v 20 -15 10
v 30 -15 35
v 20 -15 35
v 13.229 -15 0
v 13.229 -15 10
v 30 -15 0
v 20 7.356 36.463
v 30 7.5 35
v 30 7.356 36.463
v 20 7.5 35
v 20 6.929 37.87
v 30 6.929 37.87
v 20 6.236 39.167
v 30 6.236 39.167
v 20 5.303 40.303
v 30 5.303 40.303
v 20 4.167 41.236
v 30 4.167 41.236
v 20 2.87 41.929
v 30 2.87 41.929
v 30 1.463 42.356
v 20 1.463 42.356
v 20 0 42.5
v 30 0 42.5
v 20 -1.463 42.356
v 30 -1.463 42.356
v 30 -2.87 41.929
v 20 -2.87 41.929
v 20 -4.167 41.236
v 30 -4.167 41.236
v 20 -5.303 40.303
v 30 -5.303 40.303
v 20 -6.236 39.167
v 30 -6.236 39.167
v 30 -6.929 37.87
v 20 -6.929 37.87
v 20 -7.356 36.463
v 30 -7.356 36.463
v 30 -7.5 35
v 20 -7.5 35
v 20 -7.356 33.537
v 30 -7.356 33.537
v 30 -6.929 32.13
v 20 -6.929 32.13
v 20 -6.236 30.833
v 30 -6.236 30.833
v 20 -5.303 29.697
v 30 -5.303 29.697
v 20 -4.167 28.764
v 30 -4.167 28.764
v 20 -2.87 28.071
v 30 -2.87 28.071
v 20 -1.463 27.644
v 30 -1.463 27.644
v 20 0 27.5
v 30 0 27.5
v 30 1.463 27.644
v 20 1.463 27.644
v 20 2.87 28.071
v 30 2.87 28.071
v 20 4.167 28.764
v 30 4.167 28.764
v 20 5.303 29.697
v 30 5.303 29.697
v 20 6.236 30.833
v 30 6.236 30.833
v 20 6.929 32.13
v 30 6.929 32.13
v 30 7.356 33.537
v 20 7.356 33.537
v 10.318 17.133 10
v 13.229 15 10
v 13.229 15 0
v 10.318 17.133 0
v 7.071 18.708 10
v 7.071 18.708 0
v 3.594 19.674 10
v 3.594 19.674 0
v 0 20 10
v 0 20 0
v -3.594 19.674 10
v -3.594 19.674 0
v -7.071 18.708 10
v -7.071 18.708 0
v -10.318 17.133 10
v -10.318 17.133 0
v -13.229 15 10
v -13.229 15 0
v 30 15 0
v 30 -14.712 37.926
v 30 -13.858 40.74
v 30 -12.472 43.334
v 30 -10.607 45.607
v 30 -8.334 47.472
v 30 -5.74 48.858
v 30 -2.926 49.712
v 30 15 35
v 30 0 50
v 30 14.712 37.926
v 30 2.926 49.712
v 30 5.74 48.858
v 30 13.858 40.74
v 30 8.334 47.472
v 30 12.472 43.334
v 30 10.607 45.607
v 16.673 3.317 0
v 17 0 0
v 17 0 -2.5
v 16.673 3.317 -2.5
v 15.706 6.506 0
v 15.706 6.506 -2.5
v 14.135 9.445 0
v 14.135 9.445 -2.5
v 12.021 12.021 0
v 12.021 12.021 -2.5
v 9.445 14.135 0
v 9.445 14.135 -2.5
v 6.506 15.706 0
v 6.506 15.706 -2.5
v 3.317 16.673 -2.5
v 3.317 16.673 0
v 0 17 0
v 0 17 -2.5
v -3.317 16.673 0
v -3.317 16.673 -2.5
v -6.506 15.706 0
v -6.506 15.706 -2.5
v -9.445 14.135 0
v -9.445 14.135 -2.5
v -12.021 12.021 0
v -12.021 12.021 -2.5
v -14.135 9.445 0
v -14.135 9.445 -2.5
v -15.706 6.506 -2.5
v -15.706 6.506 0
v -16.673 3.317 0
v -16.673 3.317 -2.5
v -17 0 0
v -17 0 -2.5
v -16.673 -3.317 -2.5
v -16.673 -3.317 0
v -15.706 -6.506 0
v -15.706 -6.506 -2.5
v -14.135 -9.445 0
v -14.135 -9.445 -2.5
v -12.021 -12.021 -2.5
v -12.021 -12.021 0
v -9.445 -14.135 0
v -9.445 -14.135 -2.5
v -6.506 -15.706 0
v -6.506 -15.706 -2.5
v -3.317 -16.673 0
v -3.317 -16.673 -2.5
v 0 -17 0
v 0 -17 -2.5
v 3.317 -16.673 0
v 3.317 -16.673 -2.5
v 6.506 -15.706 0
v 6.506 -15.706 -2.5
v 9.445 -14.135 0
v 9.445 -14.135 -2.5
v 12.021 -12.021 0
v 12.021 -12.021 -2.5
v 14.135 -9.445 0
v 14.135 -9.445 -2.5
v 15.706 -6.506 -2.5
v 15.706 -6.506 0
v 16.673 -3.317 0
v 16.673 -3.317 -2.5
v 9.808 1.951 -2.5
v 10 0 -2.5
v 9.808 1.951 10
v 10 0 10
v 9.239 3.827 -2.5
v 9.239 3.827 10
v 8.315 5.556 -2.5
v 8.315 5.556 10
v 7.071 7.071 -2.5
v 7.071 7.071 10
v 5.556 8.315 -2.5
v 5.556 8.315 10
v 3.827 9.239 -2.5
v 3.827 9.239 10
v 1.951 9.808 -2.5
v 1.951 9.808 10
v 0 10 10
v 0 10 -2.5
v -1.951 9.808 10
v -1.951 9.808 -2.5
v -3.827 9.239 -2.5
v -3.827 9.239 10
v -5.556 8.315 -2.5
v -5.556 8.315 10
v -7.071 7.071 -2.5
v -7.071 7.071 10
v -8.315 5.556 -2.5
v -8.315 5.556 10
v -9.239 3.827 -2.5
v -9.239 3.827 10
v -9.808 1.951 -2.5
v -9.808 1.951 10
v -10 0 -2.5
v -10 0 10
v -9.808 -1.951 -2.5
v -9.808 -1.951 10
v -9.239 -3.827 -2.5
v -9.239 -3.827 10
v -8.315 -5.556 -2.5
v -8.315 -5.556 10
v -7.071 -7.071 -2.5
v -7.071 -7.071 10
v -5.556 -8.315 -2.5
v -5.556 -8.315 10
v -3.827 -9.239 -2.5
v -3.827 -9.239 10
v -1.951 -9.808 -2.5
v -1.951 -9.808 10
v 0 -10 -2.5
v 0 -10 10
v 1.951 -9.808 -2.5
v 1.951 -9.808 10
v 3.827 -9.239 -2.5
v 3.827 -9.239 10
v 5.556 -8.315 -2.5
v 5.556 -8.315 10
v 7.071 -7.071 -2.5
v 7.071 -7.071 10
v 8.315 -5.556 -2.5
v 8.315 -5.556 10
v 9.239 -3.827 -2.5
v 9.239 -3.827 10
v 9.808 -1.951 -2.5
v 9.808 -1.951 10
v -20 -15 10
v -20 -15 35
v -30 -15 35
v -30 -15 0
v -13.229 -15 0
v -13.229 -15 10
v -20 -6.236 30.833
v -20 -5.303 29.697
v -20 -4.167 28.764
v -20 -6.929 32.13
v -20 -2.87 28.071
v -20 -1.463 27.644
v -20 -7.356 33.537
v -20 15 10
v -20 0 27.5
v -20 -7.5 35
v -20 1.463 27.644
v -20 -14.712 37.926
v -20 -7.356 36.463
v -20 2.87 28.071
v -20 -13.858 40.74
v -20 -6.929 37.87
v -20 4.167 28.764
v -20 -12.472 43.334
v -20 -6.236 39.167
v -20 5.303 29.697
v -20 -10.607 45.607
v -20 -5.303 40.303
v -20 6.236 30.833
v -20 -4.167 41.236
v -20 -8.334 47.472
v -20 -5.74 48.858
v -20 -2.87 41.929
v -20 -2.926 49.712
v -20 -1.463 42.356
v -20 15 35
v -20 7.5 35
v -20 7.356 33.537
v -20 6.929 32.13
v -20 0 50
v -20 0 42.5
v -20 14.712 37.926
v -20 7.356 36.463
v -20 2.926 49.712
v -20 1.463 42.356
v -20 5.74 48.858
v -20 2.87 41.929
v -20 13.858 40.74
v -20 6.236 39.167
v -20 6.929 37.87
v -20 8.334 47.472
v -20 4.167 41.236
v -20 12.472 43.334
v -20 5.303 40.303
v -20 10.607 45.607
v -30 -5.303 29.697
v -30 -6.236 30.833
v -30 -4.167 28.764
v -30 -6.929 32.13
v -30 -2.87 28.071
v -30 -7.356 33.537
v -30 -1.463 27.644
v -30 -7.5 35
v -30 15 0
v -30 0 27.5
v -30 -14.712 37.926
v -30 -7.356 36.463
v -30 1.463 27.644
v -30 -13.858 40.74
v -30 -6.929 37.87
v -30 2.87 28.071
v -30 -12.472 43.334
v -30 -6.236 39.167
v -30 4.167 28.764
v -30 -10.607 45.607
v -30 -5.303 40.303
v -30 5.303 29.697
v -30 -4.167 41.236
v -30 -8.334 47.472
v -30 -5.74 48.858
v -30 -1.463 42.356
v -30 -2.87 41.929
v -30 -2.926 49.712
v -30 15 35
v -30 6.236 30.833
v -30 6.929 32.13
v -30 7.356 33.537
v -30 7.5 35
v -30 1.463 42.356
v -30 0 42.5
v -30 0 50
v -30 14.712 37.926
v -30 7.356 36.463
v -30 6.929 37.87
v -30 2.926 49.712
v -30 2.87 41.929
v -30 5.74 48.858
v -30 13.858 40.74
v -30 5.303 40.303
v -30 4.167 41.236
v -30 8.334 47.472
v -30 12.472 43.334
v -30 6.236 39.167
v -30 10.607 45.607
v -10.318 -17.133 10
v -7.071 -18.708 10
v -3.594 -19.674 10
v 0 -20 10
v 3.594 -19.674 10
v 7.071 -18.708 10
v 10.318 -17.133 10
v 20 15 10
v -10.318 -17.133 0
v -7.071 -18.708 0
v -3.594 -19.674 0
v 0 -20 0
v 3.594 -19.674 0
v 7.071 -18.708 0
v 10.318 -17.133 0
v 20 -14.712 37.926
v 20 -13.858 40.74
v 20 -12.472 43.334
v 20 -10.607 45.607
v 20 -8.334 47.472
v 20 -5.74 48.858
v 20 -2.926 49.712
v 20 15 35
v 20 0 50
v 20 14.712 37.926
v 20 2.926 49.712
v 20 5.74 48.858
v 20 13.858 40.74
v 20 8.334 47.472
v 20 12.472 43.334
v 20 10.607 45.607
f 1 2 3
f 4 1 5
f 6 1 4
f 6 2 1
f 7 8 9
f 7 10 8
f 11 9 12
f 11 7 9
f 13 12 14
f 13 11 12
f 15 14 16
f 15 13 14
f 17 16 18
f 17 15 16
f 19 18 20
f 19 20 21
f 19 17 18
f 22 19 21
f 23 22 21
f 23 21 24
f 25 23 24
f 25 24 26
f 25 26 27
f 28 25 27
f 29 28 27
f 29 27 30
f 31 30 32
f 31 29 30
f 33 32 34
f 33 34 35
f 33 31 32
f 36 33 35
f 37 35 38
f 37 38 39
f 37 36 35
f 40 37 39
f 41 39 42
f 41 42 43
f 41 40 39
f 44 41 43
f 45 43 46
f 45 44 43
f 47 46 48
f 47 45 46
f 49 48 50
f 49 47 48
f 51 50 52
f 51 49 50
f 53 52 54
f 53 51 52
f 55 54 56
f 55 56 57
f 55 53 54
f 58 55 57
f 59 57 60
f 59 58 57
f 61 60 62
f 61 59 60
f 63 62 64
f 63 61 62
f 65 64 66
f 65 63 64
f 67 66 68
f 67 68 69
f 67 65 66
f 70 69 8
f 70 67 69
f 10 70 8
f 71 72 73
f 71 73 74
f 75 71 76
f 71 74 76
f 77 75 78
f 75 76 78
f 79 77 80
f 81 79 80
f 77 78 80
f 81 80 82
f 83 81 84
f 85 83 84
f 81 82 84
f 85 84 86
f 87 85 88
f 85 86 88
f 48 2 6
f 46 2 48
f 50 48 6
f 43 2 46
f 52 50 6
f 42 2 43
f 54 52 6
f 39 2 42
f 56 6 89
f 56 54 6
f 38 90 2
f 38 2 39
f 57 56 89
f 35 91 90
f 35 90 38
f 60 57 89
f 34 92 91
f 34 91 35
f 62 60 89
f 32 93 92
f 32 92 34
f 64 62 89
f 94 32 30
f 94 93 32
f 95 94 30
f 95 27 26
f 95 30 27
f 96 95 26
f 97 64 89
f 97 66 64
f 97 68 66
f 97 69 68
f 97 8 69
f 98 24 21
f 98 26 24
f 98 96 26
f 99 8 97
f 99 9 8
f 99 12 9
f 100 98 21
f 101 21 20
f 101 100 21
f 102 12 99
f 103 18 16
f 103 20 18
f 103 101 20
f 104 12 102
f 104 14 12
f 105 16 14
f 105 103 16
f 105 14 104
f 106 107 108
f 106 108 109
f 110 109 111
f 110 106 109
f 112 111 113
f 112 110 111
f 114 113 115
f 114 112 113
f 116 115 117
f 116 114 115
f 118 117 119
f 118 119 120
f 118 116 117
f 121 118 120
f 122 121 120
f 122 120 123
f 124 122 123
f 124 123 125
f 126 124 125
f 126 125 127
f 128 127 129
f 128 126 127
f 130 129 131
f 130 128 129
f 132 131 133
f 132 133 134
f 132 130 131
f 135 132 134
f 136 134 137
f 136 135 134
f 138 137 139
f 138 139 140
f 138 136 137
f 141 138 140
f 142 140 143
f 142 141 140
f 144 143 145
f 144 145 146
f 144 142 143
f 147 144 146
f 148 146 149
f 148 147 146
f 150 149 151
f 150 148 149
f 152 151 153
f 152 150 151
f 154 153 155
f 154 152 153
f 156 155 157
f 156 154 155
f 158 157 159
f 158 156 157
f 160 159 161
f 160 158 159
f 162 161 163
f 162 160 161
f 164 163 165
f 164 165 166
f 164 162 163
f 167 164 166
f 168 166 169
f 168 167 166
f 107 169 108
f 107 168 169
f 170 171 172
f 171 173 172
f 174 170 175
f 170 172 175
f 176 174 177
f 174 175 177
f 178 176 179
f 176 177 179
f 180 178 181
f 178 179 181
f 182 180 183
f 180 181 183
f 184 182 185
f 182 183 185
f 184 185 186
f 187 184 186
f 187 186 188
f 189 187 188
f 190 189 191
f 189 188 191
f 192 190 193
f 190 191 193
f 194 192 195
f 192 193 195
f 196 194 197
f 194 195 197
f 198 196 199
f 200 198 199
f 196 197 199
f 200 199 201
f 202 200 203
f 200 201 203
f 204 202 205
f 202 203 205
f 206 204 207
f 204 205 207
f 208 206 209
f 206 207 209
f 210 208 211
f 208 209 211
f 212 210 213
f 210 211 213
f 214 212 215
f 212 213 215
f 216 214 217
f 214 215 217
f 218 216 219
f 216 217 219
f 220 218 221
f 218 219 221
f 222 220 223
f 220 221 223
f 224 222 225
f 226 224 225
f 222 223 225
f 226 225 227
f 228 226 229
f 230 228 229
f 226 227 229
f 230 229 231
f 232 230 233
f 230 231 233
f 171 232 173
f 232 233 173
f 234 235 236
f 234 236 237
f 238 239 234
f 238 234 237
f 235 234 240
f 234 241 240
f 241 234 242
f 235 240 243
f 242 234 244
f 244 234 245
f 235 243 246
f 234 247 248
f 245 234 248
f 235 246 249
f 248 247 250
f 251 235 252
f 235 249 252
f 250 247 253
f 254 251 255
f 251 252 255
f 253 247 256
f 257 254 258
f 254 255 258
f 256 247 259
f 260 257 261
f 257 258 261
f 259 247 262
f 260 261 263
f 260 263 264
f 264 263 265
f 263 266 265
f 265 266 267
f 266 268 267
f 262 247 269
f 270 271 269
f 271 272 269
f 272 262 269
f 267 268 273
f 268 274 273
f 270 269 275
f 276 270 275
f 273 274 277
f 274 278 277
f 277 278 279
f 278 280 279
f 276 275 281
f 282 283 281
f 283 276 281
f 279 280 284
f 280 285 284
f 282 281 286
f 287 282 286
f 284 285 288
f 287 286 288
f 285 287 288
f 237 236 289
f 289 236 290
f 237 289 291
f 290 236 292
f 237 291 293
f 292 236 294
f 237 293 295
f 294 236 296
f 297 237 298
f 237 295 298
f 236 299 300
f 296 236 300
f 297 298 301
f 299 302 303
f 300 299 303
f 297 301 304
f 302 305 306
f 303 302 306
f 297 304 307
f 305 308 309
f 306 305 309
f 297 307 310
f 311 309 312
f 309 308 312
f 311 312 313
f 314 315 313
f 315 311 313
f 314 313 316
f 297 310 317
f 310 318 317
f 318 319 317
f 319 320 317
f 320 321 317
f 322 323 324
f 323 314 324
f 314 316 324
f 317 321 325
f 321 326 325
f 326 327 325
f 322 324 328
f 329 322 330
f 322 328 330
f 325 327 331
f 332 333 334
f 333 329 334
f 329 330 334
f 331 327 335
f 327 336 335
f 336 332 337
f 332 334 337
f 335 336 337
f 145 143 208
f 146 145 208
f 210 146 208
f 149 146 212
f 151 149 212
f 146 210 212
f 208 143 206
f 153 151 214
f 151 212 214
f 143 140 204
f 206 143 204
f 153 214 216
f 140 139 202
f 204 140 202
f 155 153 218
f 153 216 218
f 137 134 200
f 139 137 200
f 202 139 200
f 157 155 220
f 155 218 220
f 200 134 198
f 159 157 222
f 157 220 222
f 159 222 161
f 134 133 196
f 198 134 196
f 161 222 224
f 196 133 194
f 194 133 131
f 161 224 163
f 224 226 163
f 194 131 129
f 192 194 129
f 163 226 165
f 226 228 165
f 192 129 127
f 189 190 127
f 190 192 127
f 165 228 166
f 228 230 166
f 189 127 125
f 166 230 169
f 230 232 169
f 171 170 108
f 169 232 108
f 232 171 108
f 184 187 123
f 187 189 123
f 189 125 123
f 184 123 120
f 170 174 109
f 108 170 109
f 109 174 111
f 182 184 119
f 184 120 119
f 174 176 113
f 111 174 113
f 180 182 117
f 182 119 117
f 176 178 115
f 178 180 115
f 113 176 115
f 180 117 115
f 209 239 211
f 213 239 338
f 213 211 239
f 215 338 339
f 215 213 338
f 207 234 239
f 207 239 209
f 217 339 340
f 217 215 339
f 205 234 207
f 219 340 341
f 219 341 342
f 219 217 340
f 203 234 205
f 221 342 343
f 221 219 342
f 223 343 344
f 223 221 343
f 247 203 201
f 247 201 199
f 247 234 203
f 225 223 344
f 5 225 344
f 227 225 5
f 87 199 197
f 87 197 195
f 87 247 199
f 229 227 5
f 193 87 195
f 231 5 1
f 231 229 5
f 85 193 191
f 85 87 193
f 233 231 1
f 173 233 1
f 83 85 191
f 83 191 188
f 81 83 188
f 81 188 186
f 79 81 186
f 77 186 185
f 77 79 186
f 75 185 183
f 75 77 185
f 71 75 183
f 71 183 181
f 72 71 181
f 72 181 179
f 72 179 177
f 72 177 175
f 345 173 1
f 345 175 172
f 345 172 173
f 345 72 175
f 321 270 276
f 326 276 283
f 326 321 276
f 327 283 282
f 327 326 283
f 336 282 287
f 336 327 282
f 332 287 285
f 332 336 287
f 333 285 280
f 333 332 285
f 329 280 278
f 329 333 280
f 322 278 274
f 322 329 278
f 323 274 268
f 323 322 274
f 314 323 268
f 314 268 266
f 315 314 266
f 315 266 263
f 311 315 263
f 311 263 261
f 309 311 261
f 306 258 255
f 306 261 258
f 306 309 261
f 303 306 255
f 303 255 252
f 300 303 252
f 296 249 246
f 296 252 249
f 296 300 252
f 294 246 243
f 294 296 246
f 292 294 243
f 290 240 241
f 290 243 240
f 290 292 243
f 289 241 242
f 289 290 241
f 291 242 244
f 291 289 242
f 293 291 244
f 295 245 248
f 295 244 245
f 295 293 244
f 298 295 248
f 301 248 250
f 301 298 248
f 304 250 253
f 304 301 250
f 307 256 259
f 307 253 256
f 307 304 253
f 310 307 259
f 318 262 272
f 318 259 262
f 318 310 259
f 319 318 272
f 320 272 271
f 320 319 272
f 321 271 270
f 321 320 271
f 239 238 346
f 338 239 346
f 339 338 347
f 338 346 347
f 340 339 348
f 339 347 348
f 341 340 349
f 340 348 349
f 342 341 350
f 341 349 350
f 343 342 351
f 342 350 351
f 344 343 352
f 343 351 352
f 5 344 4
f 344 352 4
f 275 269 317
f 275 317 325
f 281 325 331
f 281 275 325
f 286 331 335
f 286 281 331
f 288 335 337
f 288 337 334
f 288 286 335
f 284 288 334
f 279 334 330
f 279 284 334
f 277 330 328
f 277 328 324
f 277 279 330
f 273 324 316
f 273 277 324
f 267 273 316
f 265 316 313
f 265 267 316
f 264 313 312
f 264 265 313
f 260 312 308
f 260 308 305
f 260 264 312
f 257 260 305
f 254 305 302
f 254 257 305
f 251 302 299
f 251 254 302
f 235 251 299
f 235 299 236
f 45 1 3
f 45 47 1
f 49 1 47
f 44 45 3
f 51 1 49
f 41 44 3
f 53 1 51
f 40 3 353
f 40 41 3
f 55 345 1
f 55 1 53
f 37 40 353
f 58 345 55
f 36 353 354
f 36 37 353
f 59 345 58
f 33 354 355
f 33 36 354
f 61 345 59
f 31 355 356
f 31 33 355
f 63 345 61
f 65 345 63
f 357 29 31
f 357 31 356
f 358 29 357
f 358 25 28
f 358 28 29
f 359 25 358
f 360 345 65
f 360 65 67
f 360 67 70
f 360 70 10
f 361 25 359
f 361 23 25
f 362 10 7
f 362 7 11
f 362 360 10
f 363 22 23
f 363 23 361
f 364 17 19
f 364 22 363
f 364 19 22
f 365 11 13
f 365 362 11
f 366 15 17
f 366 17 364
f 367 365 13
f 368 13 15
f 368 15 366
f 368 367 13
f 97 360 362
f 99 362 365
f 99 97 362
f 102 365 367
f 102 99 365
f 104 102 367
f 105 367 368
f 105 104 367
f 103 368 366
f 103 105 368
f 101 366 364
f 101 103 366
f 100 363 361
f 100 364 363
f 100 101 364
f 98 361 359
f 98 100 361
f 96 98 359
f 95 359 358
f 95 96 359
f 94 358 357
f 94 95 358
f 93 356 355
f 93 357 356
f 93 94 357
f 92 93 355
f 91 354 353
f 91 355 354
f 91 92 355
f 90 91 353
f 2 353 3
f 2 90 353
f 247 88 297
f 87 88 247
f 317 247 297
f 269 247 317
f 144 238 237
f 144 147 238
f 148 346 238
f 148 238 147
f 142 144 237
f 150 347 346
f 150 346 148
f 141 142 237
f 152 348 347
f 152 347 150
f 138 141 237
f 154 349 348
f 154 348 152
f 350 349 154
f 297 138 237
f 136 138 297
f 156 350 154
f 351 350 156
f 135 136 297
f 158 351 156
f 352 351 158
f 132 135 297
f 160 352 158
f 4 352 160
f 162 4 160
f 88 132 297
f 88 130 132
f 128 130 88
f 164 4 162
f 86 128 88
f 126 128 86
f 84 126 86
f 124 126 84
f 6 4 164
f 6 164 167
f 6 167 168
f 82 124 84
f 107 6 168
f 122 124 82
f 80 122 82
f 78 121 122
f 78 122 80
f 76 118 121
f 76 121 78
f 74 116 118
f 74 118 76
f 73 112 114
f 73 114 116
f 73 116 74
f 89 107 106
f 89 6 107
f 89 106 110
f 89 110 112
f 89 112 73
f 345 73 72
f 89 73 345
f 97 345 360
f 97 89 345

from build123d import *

# Parameters (mm, degrees)
F0_R          = 7.5
F1_DEPTH      = 30
F2_W          = 40
F2_H          = 40
F3_DEPTH      = 25
F3_DEPTH_BACK = 25
F4_R          = 20
F5_DEPTH      = 10
F6_R          = 10
F7_DEPTH      = 50.001
F7_DEPTH_BACK = 25
F8_R          = 17
F9_DEPTH      = 2.5
F10_DEPTH     = 25


with BuildPart() as f1:
    # F0 (on Right) → F1 (new body, symmetric)
    with BuildSketch(Plane.YZ):
        with BuildLine():
            Line((-15, 35), (-15, 0))
            Line((-15, 0), (15, 0))
            Line((15, 0), (15, 35))
            ThreePointArc((15, 35), (0, 50), (-15, 35))
        make_face()
        with Locations((0, 35)):
            Circle(F0_R, mode=Mode.SUBTRACT)
    extrude(amount=F1_DEPTH, both=True)

    # F2 (on Front) → F3 (cut, two sides)
    with BuildSketch(Plane.XZ) as f3_sk:
        with Locations((0, 30)):
            Rectangle(F2_W, F2_H)
    extrude(amount=-F3_DEPTH, mode=Mode.SUBTRACT)
    extrude(f3_sk.sketch, amount=F3_DEPTH_BACK, mode=Mode.SUBTRACT)

    # F4 (on Top) → F5 (join)
    with BuildSketch(Plane.XY):
        Circle(F4_R)
    extrude(amount=F5_DEPTH)

    # F6 (on Top) → F7 (cut, two sides)
    with BuildSketch(Plane.XY) as f7_sk:
        Circle(F6_R)
    extrude(amount=F7_DEPTH, mode=Mode.SUBTRACT)
    extrude(f7_sk.sketch, amount=-F7_DEPTH_BACK, mode=Mode.SUBTRACT)

    # F8 (on Top) → F9 (join)
    with BuildSketch(Plane.XY):
        Circle(F8_R)
    extrude(amount=-F9_DEPTH)

    # F10 (cut): a face of the model
    f10_faces = [f1.faces().sort_by_distance(p)[0] for p in [
        (0, 0, 0),
    ]]
    extrude(f10_faces, amount=-F10_DEPTH, mode=Mode.SUBTRACT)


solid = f1.part
